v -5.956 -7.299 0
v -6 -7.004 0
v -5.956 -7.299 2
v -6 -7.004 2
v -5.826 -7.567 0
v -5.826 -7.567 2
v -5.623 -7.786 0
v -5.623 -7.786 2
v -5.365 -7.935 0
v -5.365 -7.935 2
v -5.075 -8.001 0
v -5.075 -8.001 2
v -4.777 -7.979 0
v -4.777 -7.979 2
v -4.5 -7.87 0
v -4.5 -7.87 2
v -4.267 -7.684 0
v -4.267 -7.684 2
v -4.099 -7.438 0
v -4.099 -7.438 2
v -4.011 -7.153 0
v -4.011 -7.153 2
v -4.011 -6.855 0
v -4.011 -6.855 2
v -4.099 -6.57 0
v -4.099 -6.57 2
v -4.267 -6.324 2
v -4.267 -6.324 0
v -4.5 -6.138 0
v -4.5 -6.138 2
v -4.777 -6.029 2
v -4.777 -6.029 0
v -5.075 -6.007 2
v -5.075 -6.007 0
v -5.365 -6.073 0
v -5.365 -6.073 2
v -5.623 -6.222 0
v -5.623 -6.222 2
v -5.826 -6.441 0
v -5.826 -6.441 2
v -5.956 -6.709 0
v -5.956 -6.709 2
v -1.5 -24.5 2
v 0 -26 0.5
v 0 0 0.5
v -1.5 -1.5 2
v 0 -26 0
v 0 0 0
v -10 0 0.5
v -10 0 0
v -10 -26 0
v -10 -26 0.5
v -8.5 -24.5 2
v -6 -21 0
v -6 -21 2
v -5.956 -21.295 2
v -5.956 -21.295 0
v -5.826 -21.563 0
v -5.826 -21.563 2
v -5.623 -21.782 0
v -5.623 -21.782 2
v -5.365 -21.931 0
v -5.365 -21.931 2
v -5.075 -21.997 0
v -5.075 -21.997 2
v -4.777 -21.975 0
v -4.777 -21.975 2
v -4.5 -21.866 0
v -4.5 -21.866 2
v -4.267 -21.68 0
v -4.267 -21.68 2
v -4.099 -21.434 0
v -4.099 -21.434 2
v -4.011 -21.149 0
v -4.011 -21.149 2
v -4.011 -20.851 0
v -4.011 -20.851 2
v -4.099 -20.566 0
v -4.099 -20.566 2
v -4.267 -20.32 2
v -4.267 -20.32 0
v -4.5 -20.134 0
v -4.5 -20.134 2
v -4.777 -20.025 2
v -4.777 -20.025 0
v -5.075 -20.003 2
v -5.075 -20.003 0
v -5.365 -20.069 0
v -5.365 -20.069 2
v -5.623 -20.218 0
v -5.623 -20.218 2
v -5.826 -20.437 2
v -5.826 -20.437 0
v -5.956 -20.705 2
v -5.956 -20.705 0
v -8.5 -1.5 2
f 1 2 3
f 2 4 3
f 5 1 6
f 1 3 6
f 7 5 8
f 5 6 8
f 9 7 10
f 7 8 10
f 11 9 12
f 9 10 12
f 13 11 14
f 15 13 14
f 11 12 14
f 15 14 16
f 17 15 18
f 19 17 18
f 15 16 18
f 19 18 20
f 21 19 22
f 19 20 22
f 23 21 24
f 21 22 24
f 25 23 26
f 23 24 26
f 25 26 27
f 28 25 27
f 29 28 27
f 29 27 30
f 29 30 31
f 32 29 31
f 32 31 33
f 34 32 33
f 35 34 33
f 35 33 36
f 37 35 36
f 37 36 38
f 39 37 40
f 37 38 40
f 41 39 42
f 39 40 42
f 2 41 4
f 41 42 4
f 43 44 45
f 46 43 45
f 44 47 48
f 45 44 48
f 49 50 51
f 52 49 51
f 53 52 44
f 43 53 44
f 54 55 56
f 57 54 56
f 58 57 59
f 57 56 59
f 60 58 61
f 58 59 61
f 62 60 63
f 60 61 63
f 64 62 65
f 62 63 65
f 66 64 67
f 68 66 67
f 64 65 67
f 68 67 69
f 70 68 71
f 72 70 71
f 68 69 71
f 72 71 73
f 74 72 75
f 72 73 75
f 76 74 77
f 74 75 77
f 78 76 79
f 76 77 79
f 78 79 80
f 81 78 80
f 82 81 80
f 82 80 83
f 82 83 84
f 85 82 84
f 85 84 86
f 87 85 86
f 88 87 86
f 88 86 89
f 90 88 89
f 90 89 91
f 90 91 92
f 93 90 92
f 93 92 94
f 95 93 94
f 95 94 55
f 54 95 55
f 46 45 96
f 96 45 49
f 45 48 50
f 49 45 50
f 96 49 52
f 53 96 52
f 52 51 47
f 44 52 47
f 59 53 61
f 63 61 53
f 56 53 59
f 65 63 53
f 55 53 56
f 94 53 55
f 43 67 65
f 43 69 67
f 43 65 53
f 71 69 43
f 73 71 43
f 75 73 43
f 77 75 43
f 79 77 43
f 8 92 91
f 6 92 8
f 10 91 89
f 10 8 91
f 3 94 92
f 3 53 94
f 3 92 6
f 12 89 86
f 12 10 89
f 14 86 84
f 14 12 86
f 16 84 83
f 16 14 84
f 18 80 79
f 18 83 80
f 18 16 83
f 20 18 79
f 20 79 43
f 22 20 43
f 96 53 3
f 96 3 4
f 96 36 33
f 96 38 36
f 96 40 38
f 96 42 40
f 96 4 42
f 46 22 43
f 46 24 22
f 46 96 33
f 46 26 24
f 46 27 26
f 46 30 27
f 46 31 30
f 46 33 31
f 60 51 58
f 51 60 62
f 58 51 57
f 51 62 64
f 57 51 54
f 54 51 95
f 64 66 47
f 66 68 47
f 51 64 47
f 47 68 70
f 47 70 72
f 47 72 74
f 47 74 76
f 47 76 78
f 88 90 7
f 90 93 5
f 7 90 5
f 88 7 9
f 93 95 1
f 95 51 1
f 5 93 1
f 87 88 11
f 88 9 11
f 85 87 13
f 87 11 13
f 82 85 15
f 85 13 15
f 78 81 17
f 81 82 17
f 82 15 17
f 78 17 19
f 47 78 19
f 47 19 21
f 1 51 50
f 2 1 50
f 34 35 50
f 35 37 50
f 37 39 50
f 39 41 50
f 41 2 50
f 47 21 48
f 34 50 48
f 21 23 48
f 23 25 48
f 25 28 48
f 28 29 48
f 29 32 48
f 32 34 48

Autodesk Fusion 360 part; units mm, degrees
sketch "Sketch1" plane through (0, 0, 0) normal (0, 0, 1) x (1, 0, 0)
  line L0 (0, 0) -> (-10, 0)
  line L1 (-10, 0) -> (-10, -26)
  line L2 (-10, -26) -> (0, -26)
  line L3 (0, -26) -> (0, 0)
  dimension "d1" = 10
  dimension "d2" = 26
extrude "Extrude1" add sketch "Sketch1" along normal blind 2
sketch "Sketch2" plane through (0, 0, 2) normal (0, 0, 1) x (-1, 0, 0)
  line L0 (0, 26) -> (0, 0)
  line L1 (0, 0) -> (10, 0)
  line L2 (10, 0) -> (10, 26)
  line L3 (10, 26) -> (0, 26)
  circle A0 centre (5, 21) radius 1
  circle A1 centre (5, 7.0039) radius 1
  point P0 (4.5847, 3.0102)
  dimension "d5" = 2
  dimension "d6" = 2
  dimension "d8" = 5
  dimension "d9" = 5
  dimension "d10" = 13.9961
  dimension "d11" = 5
extrude "Extrude2" cut sketch "Sketch2" against normal blind 10 contours A0 | A1
chamfer "Chamfer1" distance 1.5 angle 45 4 edges at (-5, -26, 2) (0, -13, 2) (-10, -13, 2) (-5, 0, 2) measured on face at (-5.0249, -2.0022, 2) measured on face at (-5.0249, -2.0022, 2) measured on face at (-5.0249, -2.0022, 2) measured on face at (-5.0249, -2.0022, 2)
